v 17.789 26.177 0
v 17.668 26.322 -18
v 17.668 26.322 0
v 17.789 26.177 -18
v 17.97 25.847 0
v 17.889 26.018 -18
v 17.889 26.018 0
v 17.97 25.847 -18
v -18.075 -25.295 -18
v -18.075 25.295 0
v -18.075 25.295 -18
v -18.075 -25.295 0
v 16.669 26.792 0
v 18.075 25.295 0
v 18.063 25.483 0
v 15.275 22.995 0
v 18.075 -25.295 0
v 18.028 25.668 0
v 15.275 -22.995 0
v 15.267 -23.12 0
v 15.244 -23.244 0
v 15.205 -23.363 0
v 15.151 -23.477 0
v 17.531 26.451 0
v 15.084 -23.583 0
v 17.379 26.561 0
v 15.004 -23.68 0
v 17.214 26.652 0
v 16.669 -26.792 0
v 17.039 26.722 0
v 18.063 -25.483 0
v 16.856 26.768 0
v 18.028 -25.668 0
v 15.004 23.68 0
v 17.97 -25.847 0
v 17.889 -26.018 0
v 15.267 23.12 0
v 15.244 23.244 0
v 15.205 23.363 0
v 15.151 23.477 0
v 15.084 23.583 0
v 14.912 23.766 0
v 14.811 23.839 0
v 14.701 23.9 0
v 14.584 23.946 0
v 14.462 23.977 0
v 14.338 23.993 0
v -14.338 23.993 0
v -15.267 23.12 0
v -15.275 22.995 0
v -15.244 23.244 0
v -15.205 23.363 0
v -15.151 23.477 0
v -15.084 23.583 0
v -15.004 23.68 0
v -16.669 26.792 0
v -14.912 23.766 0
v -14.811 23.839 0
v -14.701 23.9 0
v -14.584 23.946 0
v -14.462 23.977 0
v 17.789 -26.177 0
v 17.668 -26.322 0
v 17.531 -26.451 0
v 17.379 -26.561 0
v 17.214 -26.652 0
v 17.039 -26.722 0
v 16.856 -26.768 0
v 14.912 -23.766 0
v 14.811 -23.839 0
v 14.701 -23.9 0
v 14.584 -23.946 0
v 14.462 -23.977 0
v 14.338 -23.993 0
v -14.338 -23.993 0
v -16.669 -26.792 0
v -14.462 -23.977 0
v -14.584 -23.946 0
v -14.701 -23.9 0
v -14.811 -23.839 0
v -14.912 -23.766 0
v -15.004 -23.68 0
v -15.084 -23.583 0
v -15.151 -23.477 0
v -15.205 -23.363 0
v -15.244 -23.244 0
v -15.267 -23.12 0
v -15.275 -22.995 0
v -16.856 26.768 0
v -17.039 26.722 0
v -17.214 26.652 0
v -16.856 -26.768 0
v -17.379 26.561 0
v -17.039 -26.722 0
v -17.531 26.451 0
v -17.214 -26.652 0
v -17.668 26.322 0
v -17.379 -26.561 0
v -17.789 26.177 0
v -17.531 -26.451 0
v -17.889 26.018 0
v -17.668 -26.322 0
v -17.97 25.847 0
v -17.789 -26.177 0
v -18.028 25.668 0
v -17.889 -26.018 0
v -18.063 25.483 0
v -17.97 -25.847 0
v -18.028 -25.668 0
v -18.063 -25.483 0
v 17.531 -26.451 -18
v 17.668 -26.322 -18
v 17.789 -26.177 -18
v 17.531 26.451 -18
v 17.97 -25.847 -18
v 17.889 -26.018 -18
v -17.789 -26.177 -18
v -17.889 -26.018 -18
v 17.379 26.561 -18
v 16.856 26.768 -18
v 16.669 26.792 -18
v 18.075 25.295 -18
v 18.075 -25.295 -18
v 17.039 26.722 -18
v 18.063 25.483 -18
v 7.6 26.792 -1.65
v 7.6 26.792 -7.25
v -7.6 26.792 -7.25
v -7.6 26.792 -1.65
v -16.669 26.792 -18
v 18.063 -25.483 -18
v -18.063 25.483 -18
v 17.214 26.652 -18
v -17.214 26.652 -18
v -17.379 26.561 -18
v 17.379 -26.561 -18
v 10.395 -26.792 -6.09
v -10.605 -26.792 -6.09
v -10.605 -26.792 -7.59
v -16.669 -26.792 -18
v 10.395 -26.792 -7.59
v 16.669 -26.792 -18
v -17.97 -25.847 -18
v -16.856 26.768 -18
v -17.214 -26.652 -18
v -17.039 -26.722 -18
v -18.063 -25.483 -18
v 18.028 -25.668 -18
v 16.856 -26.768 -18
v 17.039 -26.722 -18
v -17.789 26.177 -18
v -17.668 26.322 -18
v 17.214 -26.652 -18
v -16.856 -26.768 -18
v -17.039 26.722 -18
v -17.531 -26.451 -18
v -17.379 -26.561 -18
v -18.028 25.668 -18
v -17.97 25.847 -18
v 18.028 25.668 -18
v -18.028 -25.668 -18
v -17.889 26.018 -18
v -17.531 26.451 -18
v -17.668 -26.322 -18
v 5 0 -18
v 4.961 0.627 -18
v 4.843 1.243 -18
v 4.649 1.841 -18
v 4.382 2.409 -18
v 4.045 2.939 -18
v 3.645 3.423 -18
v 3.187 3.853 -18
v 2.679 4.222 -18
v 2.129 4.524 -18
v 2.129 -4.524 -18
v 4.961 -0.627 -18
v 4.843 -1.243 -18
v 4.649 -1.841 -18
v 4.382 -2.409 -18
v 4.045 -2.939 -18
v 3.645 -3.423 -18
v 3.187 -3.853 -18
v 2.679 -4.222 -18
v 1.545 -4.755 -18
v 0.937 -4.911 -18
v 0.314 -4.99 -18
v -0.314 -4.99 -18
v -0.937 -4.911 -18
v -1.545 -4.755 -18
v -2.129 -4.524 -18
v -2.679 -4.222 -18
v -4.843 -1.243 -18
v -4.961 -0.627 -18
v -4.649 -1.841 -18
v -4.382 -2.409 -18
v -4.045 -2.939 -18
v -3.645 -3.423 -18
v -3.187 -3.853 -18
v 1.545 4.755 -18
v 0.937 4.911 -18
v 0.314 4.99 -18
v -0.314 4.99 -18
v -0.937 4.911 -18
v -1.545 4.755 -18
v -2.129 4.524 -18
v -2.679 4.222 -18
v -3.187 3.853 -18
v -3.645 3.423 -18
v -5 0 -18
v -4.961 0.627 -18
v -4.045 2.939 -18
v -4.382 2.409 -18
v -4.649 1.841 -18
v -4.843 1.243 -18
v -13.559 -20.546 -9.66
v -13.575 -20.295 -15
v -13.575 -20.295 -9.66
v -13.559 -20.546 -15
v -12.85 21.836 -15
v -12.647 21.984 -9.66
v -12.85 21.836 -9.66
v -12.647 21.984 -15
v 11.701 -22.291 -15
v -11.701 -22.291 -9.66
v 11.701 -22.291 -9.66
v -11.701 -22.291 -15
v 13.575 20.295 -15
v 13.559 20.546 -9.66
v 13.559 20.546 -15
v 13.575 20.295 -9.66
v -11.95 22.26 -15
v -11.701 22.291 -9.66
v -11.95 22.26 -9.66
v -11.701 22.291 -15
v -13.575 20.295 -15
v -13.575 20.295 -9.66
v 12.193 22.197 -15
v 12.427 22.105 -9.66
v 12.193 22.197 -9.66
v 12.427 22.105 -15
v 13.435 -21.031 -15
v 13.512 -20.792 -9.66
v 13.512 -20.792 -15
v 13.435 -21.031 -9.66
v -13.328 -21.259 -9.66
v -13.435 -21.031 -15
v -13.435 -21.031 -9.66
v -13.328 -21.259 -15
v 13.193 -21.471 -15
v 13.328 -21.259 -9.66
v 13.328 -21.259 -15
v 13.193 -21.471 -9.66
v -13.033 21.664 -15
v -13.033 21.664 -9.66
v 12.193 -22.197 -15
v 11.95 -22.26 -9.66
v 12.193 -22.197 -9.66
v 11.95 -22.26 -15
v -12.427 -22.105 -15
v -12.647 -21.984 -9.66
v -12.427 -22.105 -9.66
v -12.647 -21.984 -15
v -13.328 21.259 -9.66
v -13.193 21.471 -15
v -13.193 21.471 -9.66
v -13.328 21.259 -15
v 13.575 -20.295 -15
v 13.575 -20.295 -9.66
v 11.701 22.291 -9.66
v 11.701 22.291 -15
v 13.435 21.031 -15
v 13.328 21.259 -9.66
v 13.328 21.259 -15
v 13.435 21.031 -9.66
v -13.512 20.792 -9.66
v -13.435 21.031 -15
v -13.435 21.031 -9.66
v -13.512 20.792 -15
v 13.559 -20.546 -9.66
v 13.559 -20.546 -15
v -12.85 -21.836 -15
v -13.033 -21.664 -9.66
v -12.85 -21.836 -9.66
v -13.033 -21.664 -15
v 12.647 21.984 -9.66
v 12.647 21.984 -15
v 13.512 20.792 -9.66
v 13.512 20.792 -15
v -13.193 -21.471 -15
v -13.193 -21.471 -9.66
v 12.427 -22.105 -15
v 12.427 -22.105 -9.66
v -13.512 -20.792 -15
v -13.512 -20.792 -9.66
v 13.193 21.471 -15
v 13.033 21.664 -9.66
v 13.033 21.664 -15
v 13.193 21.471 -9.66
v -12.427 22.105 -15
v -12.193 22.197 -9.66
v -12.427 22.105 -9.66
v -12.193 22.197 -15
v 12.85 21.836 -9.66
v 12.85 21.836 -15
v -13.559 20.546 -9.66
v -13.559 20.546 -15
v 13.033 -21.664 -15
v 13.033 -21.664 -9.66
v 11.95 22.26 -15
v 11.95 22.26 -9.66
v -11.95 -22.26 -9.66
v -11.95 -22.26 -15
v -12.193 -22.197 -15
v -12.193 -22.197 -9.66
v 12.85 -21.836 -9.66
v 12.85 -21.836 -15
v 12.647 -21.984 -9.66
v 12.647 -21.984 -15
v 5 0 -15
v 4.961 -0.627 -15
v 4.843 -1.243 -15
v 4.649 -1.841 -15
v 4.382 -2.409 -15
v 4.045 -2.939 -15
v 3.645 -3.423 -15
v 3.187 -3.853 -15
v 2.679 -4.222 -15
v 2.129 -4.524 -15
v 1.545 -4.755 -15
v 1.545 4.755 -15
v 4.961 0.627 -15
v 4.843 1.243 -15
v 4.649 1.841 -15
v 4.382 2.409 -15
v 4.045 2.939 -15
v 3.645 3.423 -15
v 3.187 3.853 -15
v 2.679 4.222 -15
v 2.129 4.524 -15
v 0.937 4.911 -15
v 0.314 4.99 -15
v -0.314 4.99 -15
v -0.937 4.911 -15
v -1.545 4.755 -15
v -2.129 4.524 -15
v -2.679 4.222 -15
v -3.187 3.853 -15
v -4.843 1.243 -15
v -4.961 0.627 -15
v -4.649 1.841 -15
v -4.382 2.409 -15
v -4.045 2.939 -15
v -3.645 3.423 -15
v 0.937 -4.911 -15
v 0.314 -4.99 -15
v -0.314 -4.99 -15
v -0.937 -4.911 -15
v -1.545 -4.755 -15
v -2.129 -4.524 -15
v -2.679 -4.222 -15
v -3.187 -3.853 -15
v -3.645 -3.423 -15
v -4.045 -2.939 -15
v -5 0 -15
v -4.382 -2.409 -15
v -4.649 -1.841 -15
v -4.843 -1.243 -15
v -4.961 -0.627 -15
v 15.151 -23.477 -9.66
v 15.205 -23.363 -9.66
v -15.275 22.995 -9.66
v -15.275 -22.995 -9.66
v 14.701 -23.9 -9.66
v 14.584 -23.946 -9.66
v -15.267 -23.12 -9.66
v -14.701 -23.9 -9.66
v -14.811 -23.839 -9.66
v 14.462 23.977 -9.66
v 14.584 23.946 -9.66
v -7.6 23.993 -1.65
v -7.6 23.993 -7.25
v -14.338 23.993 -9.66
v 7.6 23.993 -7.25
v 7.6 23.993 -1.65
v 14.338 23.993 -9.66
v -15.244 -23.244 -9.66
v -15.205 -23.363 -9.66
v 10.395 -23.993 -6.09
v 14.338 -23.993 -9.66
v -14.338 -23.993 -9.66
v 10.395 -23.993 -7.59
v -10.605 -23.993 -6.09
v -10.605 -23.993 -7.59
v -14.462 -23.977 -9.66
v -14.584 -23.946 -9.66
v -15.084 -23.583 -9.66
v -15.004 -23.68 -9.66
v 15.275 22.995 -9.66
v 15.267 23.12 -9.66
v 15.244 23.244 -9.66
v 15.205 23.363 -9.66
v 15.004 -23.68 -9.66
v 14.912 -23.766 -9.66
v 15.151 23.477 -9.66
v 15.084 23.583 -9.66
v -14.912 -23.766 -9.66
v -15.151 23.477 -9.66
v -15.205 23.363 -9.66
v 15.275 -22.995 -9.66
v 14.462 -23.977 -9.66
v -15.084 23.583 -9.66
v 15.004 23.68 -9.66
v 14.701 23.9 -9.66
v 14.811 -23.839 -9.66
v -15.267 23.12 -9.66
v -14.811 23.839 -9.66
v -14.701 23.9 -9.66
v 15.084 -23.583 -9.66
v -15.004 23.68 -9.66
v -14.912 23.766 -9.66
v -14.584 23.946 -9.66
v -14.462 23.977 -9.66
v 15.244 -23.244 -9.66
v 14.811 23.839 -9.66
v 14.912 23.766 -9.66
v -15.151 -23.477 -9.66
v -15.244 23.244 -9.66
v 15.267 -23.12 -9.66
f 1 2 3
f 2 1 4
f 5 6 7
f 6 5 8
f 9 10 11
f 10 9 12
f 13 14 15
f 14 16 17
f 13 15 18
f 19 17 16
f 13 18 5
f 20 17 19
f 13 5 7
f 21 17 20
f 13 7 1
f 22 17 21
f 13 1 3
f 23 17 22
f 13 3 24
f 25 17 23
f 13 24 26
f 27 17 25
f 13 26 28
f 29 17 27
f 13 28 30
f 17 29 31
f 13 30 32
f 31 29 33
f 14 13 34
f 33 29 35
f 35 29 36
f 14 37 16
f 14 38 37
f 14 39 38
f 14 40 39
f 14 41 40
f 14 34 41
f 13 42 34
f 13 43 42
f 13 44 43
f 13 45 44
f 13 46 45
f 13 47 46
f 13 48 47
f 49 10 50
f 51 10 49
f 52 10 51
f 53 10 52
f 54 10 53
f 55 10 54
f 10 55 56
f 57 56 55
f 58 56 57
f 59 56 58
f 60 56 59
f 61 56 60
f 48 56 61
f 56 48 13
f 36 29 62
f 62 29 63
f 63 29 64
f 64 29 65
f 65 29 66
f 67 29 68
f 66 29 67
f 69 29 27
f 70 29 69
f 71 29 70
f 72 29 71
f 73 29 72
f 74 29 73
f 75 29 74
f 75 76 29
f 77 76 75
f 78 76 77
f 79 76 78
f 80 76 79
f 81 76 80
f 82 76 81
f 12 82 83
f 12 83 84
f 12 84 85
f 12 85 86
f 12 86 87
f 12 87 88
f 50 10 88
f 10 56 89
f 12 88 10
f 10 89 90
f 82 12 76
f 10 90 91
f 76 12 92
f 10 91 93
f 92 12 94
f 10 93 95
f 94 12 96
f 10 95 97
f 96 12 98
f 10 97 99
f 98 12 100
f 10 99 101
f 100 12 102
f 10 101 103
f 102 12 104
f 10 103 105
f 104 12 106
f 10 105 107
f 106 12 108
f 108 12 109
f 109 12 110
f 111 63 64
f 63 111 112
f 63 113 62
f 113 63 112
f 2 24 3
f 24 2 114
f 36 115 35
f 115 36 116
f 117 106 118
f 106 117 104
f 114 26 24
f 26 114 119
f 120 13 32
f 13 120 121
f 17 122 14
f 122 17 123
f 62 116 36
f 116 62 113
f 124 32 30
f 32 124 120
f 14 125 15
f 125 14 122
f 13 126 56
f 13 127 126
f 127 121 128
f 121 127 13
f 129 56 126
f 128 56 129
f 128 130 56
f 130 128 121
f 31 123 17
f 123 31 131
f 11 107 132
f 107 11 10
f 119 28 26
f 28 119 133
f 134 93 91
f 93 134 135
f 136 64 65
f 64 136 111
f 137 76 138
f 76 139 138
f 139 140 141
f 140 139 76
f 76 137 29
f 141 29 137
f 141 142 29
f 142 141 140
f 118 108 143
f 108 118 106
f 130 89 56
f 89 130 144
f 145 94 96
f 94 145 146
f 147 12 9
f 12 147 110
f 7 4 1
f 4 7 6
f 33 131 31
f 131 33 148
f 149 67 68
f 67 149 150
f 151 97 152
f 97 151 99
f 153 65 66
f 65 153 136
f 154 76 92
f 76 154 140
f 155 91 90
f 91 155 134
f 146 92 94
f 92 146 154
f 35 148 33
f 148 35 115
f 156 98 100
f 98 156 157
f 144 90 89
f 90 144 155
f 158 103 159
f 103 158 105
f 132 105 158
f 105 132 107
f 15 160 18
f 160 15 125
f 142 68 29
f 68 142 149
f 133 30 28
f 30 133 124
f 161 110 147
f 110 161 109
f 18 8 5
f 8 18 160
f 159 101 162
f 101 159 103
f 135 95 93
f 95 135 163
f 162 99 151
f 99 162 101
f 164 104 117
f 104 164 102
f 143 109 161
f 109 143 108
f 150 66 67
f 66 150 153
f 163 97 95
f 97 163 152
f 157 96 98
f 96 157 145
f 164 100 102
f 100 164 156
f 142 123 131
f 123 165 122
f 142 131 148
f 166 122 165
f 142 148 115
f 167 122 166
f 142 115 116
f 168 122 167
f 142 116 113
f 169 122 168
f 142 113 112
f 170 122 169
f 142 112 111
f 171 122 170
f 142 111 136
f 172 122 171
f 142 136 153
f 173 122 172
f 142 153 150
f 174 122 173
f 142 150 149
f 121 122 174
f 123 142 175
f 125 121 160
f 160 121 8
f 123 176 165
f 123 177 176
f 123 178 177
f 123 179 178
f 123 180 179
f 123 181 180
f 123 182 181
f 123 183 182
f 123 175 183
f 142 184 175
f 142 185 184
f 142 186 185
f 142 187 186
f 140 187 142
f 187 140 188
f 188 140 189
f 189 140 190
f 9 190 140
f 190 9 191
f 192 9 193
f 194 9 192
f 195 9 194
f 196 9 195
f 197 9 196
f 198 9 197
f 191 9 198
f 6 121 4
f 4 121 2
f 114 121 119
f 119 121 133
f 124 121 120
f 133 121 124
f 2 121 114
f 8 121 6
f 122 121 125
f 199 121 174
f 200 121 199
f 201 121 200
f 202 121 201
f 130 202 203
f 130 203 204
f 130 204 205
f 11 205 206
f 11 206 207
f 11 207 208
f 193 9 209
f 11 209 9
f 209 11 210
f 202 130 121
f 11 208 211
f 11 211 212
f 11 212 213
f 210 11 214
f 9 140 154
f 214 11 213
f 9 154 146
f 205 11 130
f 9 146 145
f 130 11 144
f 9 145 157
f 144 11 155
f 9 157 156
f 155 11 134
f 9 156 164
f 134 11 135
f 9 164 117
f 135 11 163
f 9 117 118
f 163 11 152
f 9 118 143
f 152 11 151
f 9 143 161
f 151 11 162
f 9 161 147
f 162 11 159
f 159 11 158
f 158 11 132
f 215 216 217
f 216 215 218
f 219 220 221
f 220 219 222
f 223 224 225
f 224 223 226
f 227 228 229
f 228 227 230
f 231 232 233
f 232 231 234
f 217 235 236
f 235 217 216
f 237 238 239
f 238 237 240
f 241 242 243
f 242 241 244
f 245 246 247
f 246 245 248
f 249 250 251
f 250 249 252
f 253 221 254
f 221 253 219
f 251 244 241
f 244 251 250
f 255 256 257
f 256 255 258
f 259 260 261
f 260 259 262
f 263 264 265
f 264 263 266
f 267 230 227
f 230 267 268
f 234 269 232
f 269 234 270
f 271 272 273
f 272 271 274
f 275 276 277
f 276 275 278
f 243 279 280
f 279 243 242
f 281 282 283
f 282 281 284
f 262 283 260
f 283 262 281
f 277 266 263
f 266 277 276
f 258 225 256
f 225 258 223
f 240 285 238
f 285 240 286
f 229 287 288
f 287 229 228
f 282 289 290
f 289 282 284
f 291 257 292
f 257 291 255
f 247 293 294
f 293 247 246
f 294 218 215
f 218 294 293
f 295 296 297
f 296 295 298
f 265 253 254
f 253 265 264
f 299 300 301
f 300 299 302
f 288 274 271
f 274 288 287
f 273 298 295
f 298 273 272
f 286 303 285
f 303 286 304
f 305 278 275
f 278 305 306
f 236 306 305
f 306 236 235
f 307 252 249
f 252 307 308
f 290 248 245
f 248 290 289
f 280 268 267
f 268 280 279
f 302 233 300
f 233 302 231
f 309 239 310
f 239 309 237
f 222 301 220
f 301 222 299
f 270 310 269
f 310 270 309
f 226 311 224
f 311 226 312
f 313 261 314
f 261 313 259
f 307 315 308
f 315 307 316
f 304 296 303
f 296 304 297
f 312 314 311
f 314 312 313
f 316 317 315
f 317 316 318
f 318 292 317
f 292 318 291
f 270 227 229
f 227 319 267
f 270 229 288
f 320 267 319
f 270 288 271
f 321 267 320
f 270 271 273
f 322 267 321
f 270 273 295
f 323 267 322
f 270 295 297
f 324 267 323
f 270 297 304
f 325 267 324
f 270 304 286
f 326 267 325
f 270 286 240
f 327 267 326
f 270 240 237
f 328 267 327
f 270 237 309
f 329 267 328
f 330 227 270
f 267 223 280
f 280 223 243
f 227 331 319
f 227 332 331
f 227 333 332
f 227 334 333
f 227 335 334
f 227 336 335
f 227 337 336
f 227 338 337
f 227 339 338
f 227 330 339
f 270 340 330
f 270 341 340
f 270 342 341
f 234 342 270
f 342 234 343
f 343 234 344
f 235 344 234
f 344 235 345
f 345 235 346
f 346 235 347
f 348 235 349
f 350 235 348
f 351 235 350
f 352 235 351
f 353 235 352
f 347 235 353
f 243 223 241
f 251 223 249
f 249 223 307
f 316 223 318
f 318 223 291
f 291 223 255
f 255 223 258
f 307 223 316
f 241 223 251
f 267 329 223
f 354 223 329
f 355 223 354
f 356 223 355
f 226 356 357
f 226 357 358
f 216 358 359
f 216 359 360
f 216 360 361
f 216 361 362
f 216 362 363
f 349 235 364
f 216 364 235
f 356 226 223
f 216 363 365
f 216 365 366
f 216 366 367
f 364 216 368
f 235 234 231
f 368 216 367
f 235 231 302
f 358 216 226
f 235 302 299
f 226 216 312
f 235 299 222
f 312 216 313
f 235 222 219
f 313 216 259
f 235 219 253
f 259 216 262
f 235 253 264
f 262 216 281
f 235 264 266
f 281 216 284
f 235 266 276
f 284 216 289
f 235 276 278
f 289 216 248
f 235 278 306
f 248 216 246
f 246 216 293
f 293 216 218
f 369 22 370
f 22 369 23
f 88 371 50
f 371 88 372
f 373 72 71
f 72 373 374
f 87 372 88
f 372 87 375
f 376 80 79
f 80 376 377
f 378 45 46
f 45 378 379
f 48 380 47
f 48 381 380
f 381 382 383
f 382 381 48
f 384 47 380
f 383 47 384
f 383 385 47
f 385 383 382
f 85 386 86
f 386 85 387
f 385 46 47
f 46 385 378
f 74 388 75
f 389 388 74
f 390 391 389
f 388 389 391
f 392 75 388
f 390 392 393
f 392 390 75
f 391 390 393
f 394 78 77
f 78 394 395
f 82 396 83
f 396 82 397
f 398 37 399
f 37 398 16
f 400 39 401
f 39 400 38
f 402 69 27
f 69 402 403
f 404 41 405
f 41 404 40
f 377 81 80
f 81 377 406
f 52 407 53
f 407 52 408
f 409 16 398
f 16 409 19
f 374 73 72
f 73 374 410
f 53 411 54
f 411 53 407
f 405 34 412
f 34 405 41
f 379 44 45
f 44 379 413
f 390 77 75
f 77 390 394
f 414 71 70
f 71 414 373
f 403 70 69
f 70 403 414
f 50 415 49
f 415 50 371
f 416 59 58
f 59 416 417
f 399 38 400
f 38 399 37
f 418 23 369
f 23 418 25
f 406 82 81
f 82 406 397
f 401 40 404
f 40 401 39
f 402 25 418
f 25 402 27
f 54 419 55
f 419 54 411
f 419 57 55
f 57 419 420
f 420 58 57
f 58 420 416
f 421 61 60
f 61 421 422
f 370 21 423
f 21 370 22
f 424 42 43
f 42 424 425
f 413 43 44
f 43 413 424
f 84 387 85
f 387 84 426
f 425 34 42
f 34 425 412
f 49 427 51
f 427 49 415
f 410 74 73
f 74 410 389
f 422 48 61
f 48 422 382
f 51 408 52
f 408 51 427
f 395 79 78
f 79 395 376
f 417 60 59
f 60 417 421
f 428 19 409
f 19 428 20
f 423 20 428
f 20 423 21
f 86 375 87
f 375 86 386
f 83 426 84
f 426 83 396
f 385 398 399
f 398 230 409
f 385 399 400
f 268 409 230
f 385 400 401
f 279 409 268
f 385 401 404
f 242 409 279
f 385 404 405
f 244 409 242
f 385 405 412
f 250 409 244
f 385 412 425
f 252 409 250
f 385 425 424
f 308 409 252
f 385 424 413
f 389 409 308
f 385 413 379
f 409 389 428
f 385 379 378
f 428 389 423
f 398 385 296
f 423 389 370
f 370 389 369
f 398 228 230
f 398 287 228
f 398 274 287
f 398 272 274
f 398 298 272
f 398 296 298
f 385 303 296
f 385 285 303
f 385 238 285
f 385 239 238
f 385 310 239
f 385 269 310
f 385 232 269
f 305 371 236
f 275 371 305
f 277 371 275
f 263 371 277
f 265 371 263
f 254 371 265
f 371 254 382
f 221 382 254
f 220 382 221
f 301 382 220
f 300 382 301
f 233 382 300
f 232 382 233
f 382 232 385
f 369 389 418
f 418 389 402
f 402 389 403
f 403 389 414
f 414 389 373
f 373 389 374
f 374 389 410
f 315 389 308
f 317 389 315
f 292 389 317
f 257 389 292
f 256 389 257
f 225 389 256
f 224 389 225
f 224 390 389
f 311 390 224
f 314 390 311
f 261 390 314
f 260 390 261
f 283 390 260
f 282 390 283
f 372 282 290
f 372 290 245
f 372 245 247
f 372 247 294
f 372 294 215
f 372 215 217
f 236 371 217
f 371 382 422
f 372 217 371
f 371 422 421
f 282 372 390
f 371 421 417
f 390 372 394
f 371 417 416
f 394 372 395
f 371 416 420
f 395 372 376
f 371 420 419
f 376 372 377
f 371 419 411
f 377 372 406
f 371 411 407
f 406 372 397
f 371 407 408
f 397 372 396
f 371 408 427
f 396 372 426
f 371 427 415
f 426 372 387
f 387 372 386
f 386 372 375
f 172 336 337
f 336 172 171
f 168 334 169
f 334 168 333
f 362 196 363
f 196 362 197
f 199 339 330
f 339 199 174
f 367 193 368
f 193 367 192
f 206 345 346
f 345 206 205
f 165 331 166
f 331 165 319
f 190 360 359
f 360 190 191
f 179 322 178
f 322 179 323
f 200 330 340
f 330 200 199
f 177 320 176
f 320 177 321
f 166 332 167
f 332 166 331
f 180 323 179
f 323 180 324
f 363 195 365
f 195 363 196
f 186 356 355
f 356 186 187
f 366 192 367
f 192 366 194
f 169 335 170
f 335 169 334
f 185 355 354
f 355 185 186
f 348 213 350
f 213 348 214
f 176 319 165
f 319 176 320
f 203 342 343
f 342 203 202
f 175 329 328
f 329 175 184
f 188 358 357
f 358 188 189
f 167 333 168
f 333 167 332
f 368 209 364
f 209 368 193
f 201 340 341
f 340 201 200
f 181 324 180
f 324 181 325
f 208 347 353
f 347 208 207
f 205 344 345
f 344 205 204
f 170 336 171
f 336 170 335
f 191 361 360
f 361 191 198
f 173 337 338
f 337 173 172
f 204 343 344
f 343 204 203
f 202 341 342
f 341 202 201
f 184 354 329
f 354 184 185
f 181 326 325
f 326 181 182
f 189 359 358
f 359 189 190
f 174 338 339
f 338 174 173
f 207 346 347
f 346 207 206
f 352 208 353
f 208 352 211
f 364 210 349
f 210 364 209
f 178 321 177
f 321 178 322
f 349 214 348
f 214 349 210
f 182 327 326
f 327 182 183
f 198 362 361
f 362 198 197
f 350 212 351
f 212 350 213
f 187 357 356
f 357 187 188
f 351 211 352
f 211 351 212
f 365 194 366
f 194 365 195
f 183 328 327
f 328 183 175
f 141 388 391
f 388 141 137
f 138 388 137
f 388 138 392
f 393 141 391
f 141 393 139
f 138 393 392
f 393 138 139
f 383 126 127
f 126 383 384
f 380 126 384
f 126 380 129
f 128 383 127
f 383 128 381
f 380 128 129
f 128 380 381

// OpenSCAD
// file: usbA-C.scad
/* [Hidden] */

TWEAK = 1;

module make_USBA(location = "UNKNOWN")
{
     // true measurements of usb.
     PUNCH_DIA = 6 + TWEAK;
     PUNCH_WIDTH = 11.0 + TWEAK;
     PUNCH_DIST = PUNCH_WIDTH - PUNCH_DIA;
     PUNCH_LENGTH = 17.0;

     // this is the hole punch size
     USB_DIA = 1.92 + TWEAK/2;
     USB_WIDTH = 7.0 + TWEAK/2;
     USB_DIST = PUNCH_WIDTH - PUNCH_DIA;
     USB_LENGTH = 5.68;
    

    mUSB_DIA = (location == "ABOVE") ? +USB_DIA/2 : location == "BELOW" ? -USB_DIA/2: 0;
    
    translate([ 0, mUSB_DIA, 0])  
    {
         if ($preview)
         {
             color("PINK")
             translate( [-PUNCH_WIDTH , -mUSB_DIA, 0])  // one face to sit 'on the board'
             rotate([90, 90, 0])
             cube( [PUNCH_WIDTH * 2, PUNCH_WIDTH * 2, 0.1], center = false);    // targeting plane
         }
         
         //translate( [0, USB_DIA/2, 0])  // one face to sit 'on the board'
         {
             color("YELLOW", .3)
             hull()
             {
                 translate([ PUNCH_DIST /2, 0, 0 ])
                 cylinder(h = PUNCH_LENGTH, d = PUNCH_DIA, $fn=100);
                 
                 translate([ -PUNCH_DIST /2, 0, 0 ])
                 cylinder(h = PUNCH_LENGTH, d = PUNCH_DIA, $fn=100);
             }
             
             rotate([180, 0, 0])
             #hull()
             {
                 translate([ USB_DIST /2, 0, 0 ])
                 cylinder(h = USB_LENGTH, d = USB_DIA, $fn=100);
                 
                 translate([ -USB_DIST /2, 0, 0 ])
                 cylinder(h = USB_LENGTH, d = USB_DIA, $fn=100);
             }
         }
     }
}

module make_USBC( location = "UNKNOWN")
{
     PUNCH_DIA = 6.10 + TWEAK;
     PUNCH_WIDTH = 10.9 + TWEAK;
     PUNCH_DIST = PUNCH_WIDTH - PUNCH_DIA;
     PUNCH_LENGTH = 14.0;

    // true usb metal dimensions.
     USB_DIA = 2.54 + TWEAK/2;
     USB_WIDTH = 8.25 + TWEAK/2;
     USB_DIST = PUNCH_WIDTH - PUNCH_DIA;
     USB_LENGTH = 7.47;

    mUSB_DIA = (location == "ABOVE") ? +USB_DIA/2 : location == "BELOW" ? -USB_DIA/2: 0;
    
    translate([ 0, mUSB_DIA, 0])  
    {
         if ($preview)
         {
             color("GREY")
             translate( [-PUNCH_WIDTH , -mUSB_DIA, 0])  // one face to sit 'on the board'
             rotate([90, 90, 0])
             cube( [PUNCH_WIDTH * 2, PUNCH_WIDTH * 2, 0.1], center = false);    // targeting plane
         }
         
         //translate( [0, USB_DIA/2, 0])  // one face to sit 'on the board'
         {
             color("ORANGE", .3)
             hull()
             {
                 translate([ PUNCH_DIST /2, 0, 0 ])
                 cylinder(h = PUNCH_LENGTH, d = PUNCH_DIA, $fn=100);
                 
                 translate([ -PUNCH_DIST /2, 0, 0 ])
                 cylinder(h = PUNCH_LENGTH, d = PUNCH_DIA, $fn=100);
             }
             
             rotate([180, 0, 0])
             #hull()
             {
                 translate([ USB_DIST /2, 0, 0 ])
                 cylinder(h = USB_LENGTH, d = USB_DIA, $fn=100);
                 
                 translate([ -USB_DIST /2, 0, 0 ])
                 cylinder(h = USB_LENGTH, d = USB_DIA, $fn=100);
             }
         }
     }

}
translate([20, 0, 0])
make_USBA("ABOVE");
translate([40,0, 0])
make_USBA("CENTER");
translate([60, 0, 0])
make_USBA("BELOW");
/*
translate([ 0, 10, 0])
{
    translate([20, 0, 0])
    make_USBC("ABOVE");
    translate([40,0, 0])
    make_USBC("CENTER");
    translate([60, 0, 0])
    make_USBC("BELOW");
}
*/
//make_USBC("CENTER");
// main file
use <usbA-C.scad>

FUDGE=.25;
wall_thickness = 3;     // total thickness of any wall


BOARD = [30.15, 45.09 + 2.50, 1.61];
BOTTOM_OF_BOARD = [ 0, 0, BOARD.z * 6];   
TOP_OF_BOARD = [ 0, 0, BOARD.z * 5];   

// WAVESHARE RIBBON ------------------------
X1 = (4.65 - 4.86)/2;
RIBBON = [ 21, 10, 1.5];         // physical connector
RIBBON_TWEAK = [ X1, 0, .46];     // it sits ON the board

// HDMI ------------------------
X2 = 0;//-2.3;
HDMI = [ 15.20, 11, 5.6];  // true dimensions
HDMI_TWEAK = [ X2, 0, +.8]; // above the board the connector starts 

cross_section = false;

LEDGE_SIZE = 1.5;
ledge = [ 0, 0, BOARD.z-.1]; //location where the board sits.
//-------------------------------------------------------------
//-------------------------------------------------------------

/* [Hidden] */

//outside dimensions of the box
box_outside_x = BOARD.x+ wall_thickness * 2;    //x dimension
box_outside_y = BOARD.y + wall_thickness * 2;   //y dimension
box_outside_z = 18;

$fn=50;

//additional parameters
lid_thickness= 2;       // comment out if no lid required
lid_lip = 2;            // 0 makes lid flush to top
lid_tolerance = .5;     // shrink lid so not squeaky fit

fn=50;

//------------------------------------------------------------------
// make 4 cylinders EXACTLY on all 4 xy permutations
module quad_cylinders(x,y,z,h,r)
{
    translate([x,y,z]){         // move post to this location
        cylinder(r = r, h = h); // make one post
    }
    translate([-x,y,z]){        // move post to this location
        cylinder(r = r, h = h); // make one post
    }   
    translate([-x,-y,z]){       // move post to this location
        cylinder(r = r, h = h); // make one post
    }
    translate([x,-y,z]){        // move post to this location
        cylinder(r = r, h = h); // make one post
    }    
}
//---------------------------------------------------------------

// make 4 cylinders to set boundaries for a hull
// all cylinders must be COMPLETELY INSIDE the x,y specs

module prep_roundbox(x,y,z,h,r)
{
    translate([x-r,y-r,z]){         // move post to this location
        cylinder(r = r, h = h); // make one post
    }
    translate([-x+r,y-r,z]){        // move post to this location
        cylinder(r = r, h = h); // make one post
    }   
    translate([-x+r,-y+r,z]){       // move post to this location
        cylinder(r = r, h = h); // make one post
    }
    translate([x-r,-y+r,z]){        // move post to this location
        cylinder(r = r, h = h); // make one post
    }    
}
//-------------------------------------------------------------------------
difference()
{
    // build the box
    union()
    {
        difference() {

            // solid box, classical outside dimenesion.
            hull(){
                prep_roundbox(  
                    x=(box_outside_x/2),
                    y=(box_outside_y/2),
                    z= -box_outside_z,
                    h= box_outside_z,
                    r = wall_thickness/2);
            }

            // hollow out solid box from above. 
            // BUT it will NOT be the dimensions of the board.
            // We need to make a ledge LATER, so this punch out will
            // be a bit smaller than the board so the board can
            // sit on something.
            
            // Go all the way down to BOTTOM less wall thickness like
            // a classic box hollow out job.
            
            
            hull(){
                prep_roundbox(
                    x=(BOARD.x/2 - LEDGE_SIZE ),
                    y=(BOARD.y/2 - LEDGE_SIZE ),
                    z= -(box_outside_z- wall_thickness), 
                    h= box_outside_z, // -BOARD.z ,
                    r = 2);
            }

            
            // the board will sit on a ledge. Cut out a board on the
            // TOP face of the box that the board will sit IN.
            
            hull(){
                prep_roundbox(
                    x=(BOARD.x/2 +.2 ),
                    y=(BOARD.y/2 + .2),
                    z= -BOTTOM_OF_BOARD.z, 
                    h=  BOTTOM_OF_BOARD.z + .01,
                    r = 1); //dont bother figuring out board radius.
            }

        }
    }  // box is complete

    translate([0, 0, -box_outside_z])
    cylinder(h = box_outside_z, d = 10);

    
    // WAVESHARE RIBBON ------------------------
    
    translate([0 , 
              -box_outside_y/2 + wall_thickness, 
              +RIBBON.z/2 ] + RIBBON_TWEAK - TOP_OF_BOARD)
    //rotate([0, 0, 90])
    #cube ([RIBBON.x, RIBBON.y, RIBBON.z], true);
    // -----------------------------------------

    // HDMI ------------------------
    translate([ 0, 
              box_outside_y/2  - HDMI.y/2 + wall_thickness, 
              +HDMI.z/2 ] + HDMI_TWEAK - TOP_OF_BOARD)
    //rotate([0, 0, 90])
    #cube ([HDMI.x,HDMI.y, HDMI.z], true);
    // -----------------------------------------
    
    if ($preview)
    {
        color("BLUE", .2)
        translate(-BOTTOM_OF_BOARD + [ 0, 0, -BOARD.z]/2)
            cube(BOARD, true);
    }
    
    INFINITY = 999999;
    // make a cross section.
    translate([cross_section? 0 : INFINITY, 
               cross_section? -box_outside_y/2 :  INFINITY,
               -box_outside_z - 5])
    cube ([ box_outside_x+1, box_outside_y+1, box_outside_z * 2]);
}


             
/*

// create a lid

translate([10 + box_outside_x, 0, 0]) 
difference()
{
    hull()
    {
            // make undrilled lid
            prep_roundbox(
                x=(box_outside_x/2  - post_diameter - wall_thickness/2 - lid_tolerance),
                y=(box_outside_y/2 - post_diameter - wall_thickness/2 - lid_tolerance),
                z= 0, // move up to create bottom
                h= lid_thickness,
                r = post_diameter);
            
            // drill outholes for the screws via difference
            // ADD the holes for the screws.
    }
    
    color("red")
    // drill the holes in the lid
    prep_roundbox( 
    x=(box_outside_x/2  - wall_thickness/2 - post_diameter/2),
    y=(box_outside_y/2 - wall_thickness/2 - post_diameter/2),
    z= 0,
    h= lid_thickness,
    r = bolt_drill_diameter/2 +.5);

}
*/
